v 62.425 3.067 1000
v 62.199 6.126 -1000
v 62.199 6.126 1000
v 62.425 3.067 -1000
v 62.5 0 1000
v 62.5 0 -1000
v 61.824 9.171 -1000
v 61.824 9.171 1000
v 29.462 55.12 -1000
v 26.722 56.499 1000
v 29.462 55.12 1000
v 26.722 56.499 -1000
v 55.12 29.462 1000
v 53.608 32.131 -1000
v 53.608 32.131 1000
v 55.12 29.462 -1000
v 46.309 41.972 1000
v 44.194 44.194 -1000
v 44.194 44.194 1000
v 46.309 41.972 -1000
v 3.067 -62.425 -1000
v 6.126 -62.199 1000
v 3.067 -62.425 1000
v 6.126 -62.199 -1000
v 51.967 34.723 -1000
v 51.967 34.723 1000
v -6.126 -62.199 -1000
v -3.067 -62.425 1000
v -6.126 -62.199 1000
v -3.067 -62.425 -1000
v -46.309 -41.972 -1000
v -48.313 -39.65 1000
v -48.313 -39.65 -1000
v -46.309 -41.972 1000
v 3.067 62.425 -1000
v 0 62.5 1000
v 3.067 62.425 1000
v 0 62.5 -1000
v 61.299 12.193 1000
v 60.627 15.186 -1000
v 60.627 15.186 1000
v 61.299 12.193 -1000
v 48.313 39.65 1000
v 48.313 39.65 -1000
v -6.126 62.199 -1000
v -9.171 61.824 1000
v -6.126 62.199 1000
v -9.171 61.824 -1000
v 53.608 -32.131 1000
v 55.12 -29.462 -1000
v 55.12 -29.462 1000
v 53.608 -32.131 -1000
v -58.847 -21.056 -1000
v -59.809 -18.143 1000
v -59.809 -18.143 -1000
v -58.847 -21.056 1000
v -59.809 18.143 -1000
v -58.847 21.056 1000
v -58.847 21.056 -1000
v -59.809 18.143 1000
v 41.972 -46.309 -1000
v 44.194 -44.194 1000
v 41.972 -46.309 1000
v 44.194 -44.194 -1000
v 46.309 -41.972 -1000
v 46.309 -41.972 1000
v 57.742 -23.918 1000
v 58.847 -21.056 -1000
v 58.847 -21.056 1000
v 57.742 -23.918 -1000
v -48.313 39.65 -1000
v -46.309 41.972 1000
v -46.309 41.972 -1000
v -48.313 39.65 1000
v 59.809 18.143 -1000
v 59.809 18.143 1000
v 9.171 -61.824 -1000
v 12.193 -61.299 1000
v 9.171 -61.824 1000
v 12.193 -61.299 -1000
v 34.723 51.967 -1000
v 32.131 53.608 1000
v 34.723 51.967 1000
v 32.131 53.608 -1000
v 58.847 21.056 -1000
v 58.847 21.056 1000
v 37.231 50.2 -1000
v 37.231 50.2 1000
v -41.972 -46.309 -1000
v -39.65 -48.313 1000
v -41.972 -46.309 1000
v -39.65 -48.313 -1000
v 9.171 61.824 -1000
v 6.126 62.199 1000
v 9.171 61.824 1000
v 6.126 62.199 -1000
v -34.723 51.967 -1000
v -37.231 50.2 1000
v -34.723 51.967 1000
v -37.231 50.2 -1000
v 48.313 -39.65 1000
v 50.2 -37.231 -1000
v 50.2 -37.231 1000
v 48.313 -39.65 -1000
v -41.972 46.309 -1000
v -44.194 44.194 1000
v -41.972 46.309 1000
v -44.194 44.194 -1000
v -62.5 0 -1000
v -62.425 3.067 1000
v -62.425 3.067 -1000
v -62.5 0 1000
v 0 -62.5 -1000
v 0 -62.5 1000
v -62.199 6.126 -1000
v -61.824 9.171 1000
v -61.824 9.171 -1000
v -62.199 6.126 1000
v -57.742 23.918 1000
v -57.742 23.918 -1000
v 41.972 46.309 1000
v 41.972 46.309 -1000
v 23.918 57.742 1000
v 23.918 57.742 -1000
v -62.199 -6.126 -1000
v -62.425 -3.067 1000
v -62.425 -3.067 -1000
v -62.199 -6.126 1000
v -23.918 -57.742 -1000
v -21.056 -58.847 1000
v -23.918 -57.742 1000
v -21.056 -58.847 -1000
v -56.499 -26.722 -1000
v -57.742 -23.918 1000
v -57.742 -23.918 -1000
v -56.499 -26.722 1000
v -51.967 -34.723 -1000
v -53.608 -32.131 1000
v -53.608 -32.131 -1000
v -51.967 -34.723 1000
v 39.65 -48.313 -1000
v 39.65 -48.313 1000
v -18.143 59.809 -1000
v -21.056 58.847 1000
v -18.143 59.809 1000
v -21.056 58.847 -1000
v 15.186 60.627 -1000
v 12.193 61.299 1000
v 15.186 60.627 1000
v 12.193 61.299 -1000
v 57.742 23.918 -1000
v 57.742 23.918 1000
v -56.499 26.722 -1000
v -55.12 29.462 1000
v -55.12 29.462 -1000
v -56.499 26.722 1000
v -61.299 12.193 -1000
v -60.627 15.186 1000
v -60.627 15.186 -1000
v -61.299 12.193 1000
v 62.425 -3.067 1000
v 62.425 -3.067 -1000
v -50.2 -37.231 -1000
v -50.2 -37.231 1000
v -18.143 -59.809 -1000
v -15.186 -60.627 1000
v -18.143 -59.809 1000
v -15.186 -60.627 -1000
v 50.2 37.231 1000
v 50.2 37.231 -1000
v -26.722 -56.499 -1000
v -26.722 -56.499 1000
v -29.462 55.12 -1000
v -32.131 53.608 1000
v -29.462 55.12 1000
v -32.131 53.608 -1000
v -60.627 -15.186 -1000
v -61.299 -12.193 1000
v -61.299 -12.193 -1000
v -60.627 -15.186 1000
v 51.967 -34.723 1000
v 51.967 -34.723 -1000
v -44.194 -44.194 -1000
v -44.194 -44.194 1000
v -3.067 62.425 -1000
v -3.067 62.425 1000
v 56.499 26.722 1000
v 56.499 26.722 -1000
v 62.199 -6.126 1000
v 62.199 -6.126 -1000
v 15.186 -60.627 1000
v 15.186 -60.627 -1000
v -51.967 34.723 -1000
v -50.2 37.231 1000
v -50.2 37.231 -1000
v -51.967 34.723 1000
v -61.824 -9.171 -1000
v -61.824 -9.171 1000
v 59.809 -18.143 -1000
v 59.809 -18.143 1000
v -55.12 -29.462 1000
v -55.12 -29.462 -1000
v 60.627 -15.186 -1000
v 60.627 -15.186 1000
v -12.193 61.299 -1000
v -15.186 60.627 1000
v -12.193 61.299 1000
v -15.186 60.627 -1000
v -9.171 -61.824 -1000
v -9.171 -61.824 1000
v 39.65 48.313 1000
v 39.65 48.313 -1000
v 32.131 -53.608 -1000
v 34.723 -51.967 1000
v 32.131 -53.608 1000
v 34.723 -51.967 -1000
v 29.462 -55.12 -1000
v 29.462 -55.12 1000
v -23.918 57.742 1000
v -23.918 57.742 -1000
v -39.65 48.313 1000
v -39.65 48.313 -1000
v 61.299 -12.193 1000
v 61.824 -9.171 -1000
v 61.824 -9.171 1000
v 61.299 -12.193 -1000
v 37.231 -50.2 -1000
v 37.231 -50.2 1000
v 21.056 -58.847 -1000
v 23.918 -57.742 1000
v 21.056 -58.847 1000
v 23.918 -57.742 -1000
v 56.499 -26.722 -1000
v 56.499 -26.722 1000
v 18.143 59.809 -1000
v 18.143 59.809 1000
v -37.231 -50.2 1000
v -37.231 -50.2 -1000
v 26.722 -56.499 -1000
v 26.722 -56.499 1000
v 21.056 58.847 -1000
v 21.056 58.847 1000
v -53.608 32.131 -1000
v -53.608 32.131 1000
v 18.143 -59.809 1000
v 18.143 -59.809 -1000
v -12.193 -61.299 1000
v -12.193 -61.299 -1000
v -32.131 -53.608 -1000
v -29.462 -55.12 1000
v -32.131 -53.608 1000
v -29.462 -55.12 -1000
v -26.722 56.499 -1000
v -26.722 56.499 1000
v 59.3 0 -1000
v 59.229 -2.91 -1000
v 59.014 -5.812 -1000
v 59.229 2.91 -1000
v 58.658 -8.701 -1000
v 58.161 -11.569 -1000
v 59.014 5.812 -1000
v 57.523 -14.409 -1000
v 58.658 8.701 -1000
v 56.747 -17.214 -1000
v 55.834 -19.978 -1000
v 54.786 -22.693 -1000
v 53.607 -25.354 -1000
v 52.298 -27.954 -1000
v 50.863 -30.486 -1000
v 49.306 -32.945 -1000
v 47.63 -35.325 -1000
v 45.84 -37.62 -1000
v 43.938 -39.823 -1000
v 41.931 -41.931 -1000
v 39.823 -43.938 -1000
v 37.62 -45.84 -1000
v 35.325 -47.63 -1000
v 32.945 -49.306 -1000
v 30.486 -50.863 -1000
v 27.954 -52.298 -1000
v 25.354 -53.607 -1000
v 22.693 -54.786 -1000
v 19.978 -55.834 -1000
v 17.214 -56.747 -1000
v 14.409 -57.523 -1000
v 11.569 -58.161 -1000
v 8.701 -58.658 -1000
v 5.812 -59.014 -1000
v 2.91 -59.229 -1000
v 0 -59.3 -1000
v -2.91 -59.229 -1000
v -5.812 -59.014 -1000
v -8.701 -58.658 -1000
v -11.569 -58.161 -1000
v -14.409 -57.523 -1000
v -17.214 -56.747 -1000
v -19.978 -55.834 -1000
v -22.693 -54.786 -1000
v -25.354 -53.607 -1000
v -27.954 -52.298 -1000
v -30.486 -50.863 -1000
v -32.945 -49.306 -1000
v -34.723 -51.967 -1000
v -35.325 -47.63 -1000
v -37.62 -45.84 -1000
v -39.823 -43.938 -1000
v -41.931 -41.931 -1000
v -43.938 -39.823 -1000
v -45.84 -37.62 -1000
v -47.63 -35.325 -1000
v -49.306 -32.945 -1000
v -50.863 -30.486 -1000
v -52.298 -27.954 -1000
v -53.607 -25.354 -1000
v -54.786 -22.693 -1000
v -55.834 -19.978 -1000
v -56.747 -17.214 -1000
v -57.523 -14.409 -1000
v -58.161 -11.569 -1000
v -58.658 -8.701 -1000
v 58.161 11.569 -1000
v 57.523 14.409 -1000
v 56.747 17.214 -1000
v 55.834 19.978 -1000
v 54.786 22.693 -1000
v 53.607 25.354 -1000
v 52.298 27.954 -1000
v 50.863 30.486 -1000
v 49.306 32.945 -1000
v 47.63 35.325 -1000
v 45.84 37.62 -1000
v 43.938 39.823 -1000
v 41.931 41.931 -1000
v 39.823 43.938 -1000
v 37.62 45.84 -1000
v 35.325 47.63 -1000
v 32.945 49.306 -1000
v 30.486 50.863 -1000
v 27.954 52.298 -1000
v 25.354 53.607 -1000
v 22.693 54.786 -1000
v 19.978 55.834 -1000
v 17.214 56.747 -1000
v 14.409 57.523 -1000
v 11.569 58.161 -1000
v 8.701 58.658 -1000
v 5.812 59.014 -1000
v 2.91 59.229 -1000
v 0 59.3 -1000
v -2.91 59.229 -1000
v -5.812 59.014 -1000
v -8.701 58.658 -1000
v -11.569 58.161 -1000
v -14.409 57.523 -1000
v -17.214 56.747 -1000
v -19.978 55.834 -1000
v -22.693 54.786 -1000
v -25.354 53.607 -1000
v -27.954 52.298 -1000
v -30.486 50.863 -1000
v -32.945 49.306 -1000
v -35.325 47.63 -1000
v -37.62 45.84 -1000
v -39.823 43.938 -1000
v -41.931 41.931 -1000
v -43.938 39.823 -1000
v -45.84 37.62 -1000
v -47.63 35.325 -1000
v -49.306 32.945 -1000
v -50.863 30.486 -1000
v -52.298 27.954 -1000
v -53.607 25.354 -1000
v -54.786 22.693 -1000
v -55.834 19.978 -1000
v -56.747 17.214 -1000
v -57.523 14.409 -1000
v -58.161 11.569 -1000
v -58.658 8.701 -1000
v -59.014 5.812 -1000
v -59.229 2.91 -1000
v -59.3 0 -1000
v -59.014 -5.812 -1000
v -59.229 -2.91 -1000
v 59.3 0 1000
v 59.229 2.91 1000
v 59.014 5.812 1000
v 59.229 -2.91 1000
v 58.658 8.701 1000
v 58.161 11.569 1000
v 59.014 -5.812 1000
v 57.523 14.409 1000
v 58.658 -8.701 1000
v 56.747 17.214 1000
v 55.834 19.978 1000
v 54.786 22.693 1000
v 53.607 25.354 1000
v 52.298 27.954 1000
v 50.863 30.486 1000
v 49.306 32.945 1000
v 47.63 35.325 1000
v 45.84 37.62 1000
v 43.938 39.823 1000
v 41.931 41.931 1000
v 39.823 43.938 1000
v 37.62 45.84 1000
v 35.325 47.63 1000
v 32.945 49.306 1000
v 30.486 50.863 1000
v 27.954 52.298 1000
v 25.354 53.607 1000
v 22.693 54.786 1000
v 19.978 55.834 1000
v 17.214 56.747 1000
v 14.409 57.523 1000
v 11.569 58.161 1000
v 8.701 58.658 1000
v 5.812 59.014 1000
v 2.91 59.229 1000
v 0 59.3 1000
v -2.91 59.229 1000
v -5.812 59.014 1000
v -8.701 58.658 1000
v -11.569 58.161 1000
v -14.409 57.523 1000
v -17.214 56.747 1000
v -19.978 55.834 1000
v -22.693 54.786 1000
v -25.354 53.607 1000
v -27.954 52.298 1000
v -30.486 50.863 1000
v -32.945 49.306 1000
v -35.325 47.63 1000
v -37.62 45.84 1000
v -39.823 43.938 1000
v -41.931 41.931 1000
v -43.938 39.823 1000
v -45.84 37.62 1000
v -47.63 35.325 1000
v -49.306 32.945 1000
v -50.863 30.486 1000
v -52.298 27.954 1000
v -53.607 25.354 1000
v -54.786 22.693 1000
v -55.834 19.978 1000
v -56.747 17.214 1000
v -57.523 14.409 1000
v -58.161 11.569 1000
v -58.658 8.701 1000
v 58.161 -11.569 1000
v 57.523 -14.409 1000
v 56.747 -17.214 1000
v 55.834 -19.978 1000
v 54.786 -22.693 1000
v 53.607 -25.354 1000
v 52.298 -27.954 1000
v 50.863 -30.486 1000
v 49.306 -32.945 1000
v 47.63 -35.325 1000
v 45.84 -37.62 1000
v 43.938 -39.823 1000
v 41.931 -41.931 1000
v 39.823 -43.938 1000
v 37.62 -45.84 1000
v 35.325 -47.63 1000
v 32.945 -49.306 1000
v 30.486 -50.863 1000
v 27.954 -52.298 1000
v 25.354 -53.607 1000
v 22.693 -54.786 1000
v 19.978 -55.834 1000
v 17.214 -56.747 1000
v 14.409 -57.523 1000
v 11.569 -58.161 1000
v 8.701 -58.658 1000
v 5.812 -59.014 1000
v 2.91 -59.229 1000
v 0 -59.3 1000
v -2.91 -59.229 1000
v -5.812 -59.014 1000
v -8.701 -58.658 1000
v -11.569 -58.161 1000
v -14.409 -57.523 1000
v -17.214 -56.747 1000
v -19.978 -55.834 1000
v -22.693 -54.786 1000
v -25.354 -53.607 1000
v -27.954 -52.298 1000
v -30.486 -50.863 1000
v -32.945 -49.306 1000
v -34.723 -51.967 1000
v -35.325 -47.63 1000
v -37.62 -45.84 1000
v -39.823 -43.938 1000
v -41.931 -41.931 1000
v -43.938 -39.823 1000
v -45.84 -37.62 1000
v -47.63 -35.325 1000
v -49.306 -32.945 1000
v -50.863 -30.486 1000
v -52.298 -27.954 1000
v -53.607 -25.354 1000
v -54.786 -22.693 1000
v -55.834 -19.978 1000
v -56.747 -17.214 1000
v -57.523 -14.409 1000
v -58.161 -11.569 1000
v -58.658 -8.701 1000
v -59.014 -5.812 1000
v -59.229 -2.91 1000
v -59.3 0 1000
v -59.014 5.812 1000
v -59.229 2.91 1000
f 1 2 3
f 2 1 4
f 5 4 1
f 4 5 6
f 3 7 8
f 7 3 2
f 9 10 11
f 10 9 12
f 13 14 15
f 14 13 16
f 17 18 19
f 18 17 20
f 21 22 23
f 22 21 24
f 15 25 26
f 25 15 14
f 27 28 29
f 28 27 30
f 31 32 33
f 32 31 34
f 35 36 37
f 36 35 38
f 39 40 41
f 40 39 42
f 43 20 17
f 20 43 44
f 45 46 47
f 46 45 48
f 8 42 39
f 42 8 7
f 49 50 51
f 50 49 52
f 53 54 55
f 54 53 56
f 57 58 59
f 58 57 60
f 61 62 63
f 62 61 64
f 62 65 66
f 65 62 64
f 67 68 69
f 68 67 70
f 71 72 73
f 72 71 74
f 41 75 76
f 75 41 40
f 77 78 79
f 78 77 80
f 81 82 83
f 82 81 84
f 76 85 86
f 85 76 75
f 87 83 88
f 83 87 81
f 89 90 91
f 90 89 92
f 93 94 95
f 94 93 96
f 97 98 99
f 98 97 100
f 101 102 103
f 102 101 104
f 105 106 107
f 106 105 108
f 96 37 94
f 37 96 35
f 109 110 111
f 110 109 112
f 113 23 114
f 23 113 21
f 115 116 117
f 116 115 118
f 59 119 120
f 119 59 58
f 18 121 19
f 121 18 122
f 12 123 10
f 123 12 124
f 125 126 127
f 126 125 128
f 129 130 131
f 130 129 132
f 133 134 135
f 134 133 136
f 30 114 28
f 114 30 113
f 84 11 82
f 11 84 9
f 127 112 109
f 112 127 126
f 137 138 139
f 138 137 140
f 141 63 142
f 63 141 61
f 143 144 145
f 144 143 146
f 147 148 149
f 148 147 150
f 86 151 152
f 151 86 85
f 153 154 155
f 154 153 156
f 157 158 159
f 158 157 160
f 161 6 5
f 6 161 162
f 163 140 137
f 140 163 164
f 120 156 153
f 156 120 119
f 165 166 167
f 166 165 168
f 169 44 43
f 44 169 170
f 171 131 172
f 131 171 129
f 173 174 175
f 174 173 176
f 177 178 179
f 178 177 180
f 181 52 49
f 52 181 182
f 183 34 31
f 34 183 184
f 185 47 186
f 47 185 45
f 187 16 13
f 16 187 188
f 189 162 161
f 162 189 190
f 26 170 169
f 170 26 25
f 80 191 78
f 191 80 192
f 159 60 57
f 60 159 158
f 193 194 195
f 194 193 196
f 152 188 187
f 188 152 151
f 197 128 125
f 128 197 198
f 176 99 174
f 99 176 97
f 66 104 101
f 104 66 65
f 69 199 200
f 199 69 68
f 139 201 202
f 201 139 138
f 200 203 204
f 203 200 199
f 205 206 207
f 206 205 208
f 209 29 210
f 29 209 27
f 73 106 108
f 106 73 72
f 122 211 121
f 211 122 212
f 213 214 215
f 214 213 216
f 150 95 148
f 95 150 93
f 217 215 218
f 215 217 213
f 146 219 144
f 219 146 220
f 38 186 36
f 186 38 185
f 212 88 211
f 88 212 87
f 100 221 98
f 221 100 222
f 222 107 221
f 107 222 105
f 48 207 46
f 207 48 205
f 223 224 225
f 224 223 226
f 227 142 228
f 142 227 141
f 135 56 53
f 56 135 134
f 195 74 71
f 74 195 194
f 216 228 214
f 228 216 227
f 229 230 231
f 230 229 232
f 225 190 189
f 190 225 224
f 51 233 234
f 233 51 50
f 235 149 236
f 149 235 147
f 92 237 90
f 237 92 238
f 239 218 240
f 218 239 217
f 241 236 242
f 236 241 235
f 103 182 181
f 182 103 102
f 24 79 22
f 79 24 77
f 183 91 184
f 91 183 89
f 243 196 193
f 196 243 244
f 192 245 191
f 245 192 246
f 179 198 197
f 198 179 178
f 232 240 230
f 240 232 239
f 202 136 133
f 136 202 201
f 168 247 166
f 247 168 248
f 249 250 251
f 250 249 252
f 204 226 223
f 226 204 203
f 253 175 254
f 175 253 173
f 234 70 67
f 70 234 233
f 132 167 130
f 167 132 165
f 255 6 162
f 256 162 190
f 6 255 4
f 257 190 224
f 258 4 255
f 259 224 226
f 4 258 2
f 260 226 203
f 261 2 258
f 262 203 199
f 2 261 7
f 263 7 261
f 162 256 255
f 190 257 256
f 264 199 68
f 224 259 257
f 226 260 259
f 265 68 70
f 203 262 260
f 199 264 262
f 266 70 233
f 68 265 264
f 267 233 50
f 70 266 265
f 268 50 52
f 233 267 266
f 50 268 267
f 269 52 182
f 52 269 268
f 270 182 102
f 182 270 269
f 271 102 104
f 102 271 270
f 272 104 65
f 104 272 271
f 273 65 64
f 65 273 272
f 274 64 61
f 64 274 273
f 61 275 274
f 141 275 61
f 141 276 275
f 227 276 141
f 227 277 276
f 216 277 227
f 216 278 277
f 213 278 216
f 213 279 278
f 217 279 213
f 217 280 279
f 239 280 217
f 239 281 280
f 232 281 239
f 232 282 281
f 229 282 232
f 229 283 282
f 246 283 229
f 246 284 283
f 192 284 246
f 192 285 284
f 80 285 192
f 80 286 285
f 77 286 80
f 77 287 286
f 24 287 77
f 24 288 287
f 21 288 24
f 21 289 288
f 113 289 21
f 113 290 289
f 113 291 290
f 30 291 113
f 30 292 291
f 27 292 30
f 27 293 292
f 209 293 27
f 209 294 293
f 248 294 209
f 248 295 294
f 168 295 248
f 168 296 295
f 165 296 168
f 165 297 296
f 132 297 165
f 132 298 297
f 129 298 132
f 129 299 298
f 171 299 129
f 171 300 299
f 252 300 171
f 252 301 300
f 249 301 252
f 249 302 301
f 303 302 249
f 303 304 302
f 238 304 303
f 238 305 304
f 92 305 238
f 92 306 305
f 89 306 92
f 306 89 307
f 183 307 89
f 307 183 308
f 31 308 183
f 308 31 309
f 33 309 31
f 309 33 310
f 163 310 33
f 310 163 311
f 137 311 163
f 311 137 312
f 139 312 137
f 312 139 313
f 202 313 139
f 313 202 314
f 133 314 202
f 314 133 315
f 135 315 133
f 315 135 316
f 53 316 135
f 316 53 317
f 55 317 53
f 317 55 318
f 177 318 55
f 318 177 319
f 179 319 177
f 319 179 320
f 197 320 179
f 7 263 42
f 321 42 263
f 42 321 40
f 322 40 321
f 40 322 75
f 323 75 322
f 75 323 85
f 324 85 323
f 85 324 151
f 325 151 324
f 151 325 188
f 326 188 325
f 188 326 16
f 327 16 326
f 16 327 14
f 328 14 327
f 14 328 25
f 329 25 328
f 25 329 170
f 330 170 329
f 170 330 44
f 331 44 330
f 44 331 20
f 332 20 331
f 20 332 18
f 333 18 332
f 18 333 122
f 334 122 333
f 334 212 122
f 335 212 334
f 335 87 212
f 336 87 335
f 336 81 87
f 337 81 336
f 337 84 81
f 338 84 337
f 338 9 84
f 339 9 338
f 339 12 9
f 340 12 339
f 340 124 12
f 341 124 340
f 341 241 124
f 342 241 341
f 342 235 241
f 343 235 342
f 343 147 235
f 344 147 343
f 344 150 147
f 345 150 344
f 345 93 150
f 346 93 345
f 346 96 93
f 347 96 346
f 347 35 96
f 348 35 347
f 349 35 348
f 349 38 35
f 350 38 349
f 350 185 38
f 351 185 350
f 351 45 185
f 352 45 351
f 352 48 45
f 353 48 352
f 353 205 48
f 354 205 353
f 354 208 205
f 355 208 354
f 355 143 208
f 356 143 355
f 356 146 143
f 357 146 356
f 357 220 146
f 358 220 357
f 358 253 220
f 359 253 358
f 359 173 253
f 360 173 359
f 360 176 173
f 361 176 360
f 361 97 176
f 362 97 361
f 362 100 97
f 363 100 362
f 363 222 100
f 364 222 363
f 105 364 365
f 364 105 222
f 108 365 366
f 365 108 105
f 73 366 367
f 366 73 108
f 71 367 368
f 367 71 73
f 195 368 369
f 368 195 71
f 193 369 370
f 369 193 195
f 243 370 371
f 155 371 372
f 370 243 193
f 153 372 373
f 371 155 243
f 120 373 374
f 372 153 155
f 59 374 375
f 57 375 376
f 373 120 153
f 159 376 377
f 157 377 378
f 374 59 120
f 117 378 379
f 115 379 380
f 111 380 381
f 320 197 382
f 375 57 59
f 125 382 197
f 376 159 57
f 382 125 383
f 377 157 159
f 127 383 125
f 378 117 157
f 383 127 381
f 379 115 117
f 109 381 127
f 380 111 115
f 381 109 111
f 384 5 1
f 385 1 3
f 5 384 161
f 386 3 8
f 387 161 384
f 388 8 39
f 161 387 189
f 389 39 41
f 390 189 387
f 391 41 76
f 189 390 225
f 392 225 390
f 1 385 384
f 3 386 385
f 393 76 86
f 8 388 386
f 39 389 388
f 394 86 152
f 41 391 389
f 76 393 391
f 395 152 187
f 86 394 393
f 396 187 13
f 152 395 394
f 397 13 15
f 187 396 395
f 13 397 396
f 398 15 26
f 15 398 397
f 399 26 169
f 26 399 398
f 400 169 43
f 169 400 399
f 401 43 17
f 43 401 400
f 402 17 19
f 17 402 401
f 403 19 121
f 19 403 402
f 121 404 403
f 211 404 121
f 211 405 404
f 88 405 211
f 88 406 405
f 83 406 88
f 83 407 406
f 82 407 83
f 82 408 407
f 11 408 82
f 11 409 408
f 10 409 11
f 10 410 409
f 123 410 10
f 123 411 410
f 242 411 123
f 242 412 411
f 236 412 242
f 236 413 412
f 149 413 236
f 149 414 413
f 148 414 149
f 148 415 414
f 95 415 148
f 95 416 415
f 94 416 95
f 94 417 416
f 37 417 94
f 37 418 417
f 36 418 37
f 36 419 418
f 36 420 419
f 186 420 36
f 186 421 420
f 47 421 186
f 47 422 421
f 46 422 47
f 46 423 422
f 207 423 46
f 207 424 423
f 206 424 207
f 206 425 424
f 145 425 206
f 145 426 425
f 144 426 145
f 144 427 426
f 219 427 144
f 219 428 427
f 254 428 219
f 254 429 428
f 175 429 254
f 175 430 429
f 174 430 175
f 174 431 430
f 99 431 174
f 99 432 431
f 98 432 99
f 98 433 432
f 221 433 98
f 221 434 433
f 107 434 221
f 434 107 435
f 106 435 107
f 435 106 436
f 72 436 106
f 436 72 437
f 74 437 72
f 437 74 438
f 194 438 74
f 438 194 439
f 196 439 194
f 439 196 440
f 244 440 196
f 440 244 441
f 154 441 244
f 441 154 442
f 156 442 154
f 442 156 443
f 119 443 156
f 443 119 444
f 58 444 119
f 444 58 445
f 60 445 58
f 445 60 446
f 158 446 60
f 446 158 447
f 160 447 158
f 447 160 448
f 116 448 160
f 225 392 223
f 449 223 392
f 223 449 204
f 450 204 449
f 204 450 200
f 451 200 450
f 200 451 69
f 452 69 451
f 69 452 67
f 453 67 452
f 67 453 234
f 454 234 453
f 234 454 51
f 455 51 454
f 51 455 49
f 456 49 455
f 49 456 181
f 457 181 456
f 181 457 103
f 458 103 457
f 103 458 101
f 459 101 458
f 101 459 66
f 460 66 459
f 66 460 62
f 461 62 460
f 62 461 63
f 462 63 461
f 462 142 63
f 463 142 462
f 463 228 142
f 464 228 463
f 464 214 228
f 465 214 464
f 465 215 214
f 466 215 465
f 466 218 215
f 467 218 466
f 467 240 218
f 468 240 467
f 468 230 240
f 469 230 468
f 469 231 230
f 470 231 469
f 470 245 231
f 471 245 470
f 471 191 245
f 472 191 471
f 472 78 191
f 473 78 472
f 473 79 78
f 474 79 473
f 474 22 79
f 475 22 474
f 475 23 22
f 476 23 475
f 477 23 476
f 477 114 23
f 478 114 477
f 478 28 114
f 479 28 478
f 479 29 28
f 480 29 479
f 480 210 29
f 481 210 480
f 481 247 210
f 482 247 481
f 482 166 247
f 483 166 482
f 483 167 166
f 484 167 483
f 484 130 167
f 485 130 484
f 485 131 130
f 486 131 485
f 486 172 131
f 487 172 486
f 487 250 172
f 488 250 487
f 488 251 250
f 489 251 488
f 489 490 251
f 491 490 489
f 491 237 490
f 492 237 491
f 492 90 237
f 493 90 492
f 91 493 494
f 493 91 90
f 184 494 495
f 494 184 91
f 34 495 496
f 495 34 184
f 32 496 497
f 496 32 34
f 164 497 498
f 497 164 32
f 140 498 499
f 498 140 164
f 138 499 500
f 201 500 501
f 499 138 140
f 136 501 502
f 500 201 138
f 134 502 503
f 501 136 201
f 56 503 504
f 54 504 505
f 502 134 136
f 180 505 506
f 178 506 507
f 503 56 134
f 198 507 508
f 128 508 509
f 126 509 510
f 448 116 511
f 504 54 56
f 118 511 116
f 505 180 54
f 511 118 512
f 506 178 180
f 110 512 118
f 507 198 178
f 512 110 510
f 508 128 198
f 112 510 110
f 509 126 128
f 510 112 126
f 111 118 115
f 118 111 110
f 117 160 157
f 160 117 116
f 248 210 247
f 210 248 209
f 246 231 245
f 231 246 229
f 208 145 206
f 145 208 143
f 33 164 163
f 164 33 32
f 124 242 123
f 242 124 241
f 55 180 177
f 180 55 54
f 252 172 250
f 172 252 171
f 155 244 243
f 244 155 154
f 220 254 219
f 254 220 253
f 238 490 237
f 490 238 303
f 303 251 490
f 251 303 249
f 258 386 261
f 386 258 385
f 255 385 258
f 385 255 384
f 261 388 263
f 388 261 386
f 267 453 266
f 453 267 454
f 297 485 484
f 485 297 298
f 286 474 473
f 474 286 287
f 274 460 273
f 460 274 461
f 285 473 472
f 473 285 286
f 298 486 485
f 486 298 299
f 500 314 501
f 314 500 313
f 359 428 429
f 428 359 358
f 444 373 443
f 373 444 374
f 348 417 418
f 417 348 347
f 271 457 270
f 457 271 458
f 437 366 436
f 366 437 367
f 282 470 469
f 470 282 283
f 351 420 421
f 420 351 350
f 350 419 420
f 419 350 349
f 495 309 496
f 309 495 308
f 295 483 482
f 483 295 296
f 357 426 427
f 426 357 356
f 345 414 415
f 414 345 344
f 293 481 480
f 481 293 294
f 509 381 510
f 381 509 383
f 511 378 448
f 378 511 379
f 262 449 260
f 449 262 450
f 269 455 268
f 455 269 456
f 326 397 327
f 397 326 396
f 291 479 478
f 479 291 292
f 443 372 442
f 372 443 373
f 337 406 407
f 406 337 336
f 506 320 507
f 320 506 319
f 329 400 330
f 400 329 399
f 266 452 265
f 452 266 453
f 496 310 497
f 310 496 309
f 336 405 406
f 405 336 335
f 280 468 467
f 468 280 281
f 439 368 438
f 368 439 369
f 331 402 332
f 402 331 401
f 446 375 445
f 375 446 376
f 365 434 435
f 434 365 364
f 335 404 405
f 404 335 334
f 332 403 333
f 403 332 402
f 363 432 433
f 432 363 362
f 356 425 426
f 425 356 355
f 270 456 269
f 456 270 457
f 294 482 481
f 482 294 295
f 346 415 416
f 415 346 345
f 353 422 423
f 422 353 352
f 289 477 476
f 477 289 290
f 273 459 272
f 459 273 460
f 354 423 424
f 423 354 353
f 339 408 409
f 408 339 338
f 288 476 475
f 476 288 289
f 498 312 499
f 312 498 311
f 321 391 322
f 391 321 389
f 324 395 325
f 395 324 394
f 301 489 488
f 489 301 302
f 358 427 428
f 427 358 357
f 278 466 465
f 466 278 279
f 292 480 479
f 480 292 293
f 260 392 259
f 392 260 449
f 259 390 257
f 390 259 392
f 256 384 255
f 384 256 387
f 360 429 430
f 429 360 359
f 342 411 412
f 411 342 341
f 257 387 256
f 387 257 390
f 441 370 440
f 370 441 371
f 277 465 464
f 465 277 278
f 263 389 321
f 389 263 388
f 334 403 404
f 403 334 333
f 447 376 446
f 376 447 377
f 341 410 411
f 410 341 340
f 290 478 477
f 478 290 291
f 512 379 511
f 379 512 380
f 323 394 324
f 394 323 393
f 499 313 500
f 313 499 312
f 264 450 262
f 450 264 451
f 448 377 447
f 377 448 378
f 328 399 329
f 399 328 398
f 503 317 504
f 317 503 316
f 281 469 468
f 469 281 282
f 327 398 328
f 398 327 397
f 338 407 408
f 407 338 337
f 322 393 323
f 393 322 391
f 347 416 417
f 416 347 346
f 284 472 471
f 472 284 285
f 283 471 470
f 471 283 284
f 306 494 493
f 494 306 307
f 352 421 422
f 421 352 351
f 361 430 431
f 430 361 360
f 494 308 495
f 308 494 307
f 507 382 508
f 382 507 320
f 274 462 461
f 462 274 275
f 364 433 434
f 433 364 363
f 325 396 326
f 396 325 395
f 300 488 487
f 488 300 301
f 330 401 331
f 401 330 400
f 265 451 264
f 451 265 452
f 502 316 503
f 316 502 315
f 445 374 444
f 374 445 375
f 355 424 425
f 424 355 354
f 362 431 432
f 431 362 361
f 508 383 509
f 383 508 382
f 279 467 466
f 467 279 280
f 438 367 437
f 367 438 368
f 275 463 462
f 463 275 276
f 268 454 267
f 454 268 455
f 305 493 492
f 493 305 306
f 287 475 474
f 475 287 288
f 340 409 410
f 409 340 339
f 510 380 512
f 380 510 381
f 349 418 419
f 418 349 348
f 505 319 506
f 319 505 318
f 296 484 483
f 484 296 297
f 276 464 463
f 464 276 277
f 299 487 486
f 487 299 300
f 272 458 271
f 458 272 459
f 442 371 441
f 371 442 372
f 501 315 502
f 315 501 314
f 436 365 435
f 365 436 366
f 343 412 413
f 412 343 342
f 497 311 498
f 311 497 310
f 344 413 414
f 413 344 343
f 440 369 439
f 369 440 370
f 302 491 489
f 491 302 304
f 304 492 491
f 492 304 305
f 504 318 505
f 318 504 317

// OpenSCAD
$fn=128;

module ht_pipe(od=125, length=2000, wall=3.2) {
    difference() {
        cylinder(h=length, d=od, center=true);
        cylinder(h=length+2, d=od-2*wall, center=true);
    }
}

ht_pipe(od=125, length=2000, wall=3.2);
